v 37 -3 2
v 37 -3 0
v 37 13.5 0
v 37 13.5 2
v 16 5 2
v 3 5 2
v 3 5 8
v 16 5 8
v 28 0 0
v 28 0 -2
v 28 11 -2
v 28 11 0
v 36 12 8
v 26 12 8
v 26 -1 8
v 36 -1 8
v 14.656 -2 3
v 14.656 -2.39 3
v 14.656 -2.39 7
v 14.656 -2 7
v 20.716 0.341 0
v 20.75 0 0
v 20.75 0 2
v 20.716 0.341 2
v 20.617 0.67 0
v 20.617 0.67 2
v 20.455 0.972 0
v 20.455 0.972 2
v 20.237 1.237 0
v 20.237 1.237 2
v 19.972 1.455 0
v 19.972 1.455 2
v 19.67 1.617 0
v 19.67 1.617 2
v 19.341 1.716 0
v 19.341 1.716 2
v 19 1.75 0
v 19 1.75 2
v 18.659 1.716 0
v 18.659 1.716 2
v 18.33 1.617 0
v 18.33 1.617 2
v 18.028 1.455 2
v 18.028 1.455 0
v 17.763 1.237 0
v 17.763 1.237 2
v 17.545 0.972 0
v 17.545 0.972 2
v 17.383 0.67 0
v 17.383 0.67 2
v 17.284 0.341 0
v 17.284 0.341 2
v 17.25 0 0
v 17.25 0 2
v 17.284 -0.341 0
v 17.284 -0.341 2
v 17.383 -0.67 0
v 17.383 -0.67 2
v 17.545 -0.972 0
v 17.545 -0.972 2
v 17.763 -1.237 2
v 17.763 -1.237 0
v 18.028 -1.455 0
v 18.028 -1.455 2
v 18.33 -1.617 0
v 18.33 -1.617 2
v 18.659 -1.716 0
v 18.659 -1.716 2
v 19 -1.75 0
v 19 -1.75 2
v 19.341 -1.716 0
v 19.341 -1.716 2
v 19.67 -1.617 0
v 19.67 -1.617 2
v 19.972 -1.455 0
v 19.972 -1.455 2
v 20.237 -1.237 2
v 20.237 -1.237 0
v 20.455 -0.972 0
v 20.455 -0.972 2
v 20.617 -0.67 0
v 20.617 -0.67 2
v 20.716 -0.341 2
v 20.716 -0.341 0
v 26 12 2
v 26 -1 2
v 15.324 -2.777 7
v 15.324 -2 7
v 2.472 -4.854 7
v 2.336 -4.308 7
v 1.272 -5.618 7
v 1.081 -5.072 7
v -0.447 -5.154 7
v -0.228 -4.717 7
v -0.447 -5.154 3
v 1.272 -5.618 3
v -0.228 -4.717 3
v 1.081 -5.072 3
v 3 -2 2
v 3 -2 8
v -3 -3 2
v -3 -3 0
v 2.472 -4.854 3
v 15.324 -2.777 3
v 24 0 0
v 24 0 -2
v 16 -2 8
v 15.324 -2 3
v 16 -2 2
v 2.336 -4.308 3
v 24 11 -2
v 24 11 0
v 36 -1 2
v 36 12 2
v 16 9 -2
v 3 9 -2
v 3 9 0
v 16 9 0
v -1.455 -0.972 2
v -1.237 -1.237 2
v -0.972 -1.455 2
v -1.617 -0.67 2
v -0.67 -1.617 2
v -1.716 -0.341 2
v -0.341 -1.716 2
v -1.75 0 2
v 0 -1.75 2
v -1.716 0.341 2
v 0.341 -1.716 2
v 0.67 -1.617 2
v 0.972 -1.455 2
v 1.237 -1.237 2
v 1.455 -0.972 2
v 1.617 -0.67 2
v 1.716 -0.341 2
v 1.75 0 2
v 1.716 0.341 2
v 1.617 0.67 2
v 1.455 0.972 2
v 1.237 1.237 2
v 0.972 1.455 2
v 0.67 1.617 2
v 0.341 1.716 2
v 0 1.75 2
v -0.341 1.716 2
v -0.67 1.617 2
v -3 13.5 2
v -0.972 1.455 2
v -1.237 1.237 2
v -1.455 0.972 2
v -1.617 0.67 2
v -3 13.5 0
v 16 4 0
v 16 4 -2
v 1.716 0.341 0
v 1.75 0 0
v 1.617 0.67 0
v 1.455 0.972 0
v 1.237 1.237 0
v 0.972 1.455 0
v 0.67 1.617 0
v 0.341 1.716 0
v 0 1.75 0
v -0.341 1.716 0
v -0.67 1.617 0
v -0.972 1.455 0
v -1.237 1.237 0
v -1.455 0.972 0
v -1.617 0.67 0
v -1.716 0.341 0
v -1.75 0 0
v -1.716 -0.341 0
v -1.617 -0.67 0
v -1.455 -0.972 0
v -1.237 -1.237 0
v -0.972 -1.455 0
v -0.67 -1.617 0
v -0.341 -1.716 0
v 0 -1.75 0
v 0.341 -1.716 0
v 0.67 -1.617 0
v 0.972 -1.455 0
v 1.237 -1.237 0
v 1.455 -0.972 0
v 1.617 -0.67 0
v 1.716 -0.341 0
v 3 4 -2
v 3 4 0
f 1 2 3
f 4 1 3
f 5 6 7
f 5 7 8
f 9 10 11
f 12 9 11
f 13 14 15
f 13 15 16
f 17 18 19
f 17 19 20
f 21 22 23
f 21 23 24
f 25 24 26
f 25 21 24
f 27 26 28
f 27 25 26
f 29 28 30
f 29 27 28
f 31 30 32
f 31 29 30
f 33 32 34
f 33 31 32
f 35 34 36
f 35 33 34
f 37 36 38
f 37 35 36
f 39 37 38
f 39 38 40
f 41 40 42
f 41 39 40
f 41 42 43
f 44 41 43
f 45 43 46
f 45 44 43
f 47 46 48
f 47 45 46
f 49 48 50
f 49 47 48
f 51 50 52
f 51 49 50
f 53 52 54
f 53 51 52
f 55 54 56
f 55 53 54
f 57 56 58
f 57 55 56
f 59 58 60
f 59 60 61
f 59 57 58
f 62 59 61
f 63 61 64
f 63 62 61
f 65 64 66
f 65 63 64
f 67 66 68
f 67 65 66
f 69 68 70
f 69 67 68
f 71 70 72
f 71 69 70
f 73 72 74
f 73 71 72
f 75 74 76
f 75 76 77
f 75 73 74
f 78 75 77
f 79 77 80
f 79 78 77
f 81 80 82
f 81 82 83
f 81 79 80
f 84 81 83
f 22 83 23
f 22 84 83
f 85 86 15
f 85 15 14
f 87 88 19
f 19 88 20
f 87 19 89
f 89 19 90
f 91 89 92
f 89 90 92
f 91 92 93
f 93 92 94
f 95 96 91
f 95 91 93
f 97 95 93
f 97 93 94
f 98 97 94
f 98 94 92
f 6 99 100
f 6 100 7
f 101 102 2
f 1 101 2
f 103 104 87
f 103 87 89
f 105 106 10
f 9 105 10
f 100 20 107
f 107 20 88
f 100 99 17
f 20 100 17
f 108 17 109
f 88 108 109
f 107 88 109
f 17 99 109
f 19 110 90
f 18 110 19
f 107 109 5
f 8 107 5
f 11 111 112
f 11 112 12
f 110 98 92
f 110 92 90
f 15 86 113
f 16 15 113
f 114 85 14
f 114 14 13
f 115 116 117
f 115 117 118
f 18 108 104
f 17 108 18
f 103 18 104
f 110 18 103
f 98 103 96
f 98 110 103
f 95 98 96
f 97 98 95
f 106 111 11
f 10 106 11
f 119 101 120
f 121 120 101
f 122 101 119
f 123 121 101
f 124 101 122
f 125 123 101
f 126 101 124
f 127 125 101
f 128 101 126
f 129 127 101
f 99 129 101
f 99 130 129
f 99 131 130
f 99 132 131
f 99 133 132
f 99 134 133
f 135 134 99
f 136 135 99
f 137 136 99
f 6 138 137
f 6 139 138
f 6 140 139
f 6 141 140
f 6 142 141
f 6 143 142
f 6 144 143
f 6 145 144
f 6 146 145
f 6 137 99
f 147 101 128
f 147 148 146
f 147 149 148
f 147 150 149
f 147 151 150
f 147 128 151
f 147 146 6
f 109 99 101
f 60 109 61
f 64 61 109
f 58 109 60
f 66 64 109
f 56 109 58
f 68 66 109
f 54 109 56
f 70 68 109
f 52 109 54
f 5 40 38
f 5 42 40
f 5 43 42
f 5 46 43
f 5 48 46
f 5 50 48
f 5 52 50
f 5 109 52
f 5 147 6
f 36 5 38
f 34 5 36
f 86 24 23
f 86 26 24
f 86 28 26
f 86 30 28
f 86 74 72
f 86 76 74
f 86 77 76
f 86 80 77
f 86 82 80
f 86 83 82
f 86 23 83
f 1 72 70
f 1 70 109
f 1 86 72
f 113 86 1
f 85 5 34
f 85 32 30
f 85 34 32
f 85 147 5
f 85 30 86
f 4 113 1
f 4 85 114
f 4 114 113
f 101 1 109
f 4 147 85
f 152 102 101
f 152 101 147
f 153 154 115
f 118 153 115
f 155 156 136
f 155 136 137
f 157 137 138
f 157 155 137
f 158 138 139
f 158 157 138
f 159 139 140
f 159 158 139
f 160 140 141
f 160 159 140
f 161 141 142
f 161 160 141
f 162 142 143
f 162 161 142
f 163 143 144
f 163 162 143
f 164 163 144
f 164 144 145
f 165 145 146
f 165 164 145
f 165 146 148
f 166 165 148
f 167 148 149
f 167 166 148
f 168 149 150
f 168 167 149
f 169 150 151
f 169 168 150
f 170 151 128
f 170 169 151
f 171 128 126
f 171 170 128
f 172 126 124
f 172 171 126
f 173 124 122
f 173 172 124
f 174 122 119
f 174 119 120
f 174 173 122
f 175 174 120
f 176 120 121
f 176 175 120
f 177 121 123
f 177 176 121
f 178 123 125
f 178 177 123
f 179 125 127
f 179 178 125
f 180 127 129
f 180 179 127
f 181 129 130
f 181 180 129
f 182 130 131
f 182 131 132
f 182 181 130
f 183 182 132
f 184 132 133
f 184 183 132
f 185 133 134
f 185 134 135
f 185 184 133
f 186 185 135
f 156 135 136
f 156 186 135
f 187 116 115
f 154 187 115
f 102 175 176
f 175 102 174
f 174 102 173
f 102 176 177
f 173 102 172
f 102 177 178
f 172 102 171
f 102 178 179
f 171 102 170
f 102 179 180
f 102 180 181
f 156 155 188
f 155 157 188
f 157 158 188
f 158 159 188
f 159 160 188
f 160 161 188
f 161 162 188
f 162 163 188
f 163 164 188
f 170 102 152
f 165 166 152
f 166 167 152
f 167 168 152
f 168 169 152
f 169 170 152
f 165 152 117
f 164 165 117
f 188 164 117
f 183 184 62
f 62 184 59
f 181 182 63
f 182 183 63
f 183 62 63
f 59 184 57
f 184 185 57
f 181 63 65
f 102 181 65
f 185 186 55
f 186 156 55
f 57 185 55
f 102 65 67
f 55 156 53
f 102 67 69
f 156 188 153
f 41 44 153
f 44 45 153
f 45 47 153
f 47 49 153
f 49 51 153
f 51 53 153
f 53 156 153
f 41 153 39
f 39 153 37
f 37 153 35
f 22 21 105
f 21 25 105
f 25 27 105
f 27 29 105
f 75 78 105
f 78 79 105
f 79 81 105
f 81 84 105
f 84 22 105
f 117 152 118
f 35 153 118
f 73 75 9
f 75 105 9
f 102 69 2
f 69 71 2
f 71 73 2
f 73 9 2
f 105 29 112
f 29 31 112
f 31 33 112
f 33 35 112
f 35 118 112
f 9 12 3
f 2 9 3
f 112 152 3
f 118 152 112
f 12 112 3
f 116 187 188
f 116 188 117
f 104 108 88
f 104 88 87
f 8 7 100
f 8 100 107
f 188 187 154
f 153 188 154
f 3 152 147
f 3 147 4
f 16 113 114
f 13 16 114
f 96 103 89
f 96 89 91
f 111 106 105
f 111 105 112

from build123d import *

# Parameters (mm, degrees)
BOX004_W     = 4
BOX004_H     = 11
BOX004_DEPTH = 2
BOX002_W     = 10
BOX002_H     = 13
BOX002_DEPTH = 6
BOX001_W     = 13
BOX001_H     = 7
BOX001_DEPTH = 6
PAD003_DEPTH = 4
SKETCH002_W  = 40
SKETCH002_H  = 16.5
SKETCH002_R  = 1.75
PAD002_DEPTH = 2
BOX003_W     = 13
BOX003_H     = 5
BOX003_DEPTH = 2


with BuildPart() as cube004:
    # Box004 → Box004 (new body)
    with BuildSketch(Plane(origin=(24, 0, -2), x_dir=(1, 0, 0), z_dir=(0, 0, 1))):
        with Locations((2, 5.5)):
            Rectangle(BOX004_W, BOX004_H)
    extrude(amount=BOX004_DEPTH)


with BuildPart() as cube002:
    # Box002 → Box002 (new body)
    with BuildSketch(Plane(origin=(26, -1, 2), x_dir=(1, 0, 0), z_dir=(0, 0, 1))):
        with Locations((5, 6.5)):
            Rectangle(BOX002_W, BOX002_H)
    extrude(amount=BOX002_DEPTH)


with BuildPart() as cube001:
    # Box001 → Box001 (new body)
    with BuildSketch(Plane(origin=(3, -2, 2), x_dir=(1, 0, 0), z_dir=(0, 0, 1))):
        with Locations((6.5, 3.5)):
            Rectangle(BOX001_W, BOX001_H)
    extrude(amount=BOX001_DEPTH)


with BuildPart() as fusion005:
    # Sketch003 → Pad003 (new body)
    with BuildSketch(Plane.XY.offset(3)):
        Polygon((15.32428, -1.087794), (15.32428, -2.777316), (2.472262, -4.853757), (1.271945, -5.617596), (-0.446694, -5.153837), (-0.228454, -4.717358), (1.080985, -5.071997), (2.335863, -4.308158), (14.655511, -2.390134), (14.655511, -1.087794), align=None)
    extrude(amount=PAD003_DEPTH)

    # Fusion005: union Cube001
    add(cube001.part)


with BuildPart() as pad002:
    # Sketch002 → Pad002 (new body)
    with BuildSketch(Plane.XY):
        with Locations((17, 5.25)):
            Rectangle(SKETCH002_W, SKETCH002_H)
        Circle(SKETCH002_R, mode=Mode.SUBTRACT)
        with Locations((19, 0)):
            Circle(SKETCH002_R, mode=Mode.SUBTRACT)
    extrude(amount=PAD002_DEPTH)


with BuildPart() as endstop:
    # Box003 → Box003 (new body)
    with BuildSketch(Plane(origin=(3, 4, -2), x_dir=(1, 0, 0), z_dir=(0, 0, 1))):
        with Locations((6.5, 2.5)):
            Rectangle(BOX003_W, BOX003_H)
    extrude(amount=BOX003_DEPTH)

    # Fusion006: union Cube004, Cube002, Fusion005, Pad002
    add(cube004.part)
    add(cube002.part)
    add(fusion005.part)
    add(pad002.part)


solid = endstop.part
